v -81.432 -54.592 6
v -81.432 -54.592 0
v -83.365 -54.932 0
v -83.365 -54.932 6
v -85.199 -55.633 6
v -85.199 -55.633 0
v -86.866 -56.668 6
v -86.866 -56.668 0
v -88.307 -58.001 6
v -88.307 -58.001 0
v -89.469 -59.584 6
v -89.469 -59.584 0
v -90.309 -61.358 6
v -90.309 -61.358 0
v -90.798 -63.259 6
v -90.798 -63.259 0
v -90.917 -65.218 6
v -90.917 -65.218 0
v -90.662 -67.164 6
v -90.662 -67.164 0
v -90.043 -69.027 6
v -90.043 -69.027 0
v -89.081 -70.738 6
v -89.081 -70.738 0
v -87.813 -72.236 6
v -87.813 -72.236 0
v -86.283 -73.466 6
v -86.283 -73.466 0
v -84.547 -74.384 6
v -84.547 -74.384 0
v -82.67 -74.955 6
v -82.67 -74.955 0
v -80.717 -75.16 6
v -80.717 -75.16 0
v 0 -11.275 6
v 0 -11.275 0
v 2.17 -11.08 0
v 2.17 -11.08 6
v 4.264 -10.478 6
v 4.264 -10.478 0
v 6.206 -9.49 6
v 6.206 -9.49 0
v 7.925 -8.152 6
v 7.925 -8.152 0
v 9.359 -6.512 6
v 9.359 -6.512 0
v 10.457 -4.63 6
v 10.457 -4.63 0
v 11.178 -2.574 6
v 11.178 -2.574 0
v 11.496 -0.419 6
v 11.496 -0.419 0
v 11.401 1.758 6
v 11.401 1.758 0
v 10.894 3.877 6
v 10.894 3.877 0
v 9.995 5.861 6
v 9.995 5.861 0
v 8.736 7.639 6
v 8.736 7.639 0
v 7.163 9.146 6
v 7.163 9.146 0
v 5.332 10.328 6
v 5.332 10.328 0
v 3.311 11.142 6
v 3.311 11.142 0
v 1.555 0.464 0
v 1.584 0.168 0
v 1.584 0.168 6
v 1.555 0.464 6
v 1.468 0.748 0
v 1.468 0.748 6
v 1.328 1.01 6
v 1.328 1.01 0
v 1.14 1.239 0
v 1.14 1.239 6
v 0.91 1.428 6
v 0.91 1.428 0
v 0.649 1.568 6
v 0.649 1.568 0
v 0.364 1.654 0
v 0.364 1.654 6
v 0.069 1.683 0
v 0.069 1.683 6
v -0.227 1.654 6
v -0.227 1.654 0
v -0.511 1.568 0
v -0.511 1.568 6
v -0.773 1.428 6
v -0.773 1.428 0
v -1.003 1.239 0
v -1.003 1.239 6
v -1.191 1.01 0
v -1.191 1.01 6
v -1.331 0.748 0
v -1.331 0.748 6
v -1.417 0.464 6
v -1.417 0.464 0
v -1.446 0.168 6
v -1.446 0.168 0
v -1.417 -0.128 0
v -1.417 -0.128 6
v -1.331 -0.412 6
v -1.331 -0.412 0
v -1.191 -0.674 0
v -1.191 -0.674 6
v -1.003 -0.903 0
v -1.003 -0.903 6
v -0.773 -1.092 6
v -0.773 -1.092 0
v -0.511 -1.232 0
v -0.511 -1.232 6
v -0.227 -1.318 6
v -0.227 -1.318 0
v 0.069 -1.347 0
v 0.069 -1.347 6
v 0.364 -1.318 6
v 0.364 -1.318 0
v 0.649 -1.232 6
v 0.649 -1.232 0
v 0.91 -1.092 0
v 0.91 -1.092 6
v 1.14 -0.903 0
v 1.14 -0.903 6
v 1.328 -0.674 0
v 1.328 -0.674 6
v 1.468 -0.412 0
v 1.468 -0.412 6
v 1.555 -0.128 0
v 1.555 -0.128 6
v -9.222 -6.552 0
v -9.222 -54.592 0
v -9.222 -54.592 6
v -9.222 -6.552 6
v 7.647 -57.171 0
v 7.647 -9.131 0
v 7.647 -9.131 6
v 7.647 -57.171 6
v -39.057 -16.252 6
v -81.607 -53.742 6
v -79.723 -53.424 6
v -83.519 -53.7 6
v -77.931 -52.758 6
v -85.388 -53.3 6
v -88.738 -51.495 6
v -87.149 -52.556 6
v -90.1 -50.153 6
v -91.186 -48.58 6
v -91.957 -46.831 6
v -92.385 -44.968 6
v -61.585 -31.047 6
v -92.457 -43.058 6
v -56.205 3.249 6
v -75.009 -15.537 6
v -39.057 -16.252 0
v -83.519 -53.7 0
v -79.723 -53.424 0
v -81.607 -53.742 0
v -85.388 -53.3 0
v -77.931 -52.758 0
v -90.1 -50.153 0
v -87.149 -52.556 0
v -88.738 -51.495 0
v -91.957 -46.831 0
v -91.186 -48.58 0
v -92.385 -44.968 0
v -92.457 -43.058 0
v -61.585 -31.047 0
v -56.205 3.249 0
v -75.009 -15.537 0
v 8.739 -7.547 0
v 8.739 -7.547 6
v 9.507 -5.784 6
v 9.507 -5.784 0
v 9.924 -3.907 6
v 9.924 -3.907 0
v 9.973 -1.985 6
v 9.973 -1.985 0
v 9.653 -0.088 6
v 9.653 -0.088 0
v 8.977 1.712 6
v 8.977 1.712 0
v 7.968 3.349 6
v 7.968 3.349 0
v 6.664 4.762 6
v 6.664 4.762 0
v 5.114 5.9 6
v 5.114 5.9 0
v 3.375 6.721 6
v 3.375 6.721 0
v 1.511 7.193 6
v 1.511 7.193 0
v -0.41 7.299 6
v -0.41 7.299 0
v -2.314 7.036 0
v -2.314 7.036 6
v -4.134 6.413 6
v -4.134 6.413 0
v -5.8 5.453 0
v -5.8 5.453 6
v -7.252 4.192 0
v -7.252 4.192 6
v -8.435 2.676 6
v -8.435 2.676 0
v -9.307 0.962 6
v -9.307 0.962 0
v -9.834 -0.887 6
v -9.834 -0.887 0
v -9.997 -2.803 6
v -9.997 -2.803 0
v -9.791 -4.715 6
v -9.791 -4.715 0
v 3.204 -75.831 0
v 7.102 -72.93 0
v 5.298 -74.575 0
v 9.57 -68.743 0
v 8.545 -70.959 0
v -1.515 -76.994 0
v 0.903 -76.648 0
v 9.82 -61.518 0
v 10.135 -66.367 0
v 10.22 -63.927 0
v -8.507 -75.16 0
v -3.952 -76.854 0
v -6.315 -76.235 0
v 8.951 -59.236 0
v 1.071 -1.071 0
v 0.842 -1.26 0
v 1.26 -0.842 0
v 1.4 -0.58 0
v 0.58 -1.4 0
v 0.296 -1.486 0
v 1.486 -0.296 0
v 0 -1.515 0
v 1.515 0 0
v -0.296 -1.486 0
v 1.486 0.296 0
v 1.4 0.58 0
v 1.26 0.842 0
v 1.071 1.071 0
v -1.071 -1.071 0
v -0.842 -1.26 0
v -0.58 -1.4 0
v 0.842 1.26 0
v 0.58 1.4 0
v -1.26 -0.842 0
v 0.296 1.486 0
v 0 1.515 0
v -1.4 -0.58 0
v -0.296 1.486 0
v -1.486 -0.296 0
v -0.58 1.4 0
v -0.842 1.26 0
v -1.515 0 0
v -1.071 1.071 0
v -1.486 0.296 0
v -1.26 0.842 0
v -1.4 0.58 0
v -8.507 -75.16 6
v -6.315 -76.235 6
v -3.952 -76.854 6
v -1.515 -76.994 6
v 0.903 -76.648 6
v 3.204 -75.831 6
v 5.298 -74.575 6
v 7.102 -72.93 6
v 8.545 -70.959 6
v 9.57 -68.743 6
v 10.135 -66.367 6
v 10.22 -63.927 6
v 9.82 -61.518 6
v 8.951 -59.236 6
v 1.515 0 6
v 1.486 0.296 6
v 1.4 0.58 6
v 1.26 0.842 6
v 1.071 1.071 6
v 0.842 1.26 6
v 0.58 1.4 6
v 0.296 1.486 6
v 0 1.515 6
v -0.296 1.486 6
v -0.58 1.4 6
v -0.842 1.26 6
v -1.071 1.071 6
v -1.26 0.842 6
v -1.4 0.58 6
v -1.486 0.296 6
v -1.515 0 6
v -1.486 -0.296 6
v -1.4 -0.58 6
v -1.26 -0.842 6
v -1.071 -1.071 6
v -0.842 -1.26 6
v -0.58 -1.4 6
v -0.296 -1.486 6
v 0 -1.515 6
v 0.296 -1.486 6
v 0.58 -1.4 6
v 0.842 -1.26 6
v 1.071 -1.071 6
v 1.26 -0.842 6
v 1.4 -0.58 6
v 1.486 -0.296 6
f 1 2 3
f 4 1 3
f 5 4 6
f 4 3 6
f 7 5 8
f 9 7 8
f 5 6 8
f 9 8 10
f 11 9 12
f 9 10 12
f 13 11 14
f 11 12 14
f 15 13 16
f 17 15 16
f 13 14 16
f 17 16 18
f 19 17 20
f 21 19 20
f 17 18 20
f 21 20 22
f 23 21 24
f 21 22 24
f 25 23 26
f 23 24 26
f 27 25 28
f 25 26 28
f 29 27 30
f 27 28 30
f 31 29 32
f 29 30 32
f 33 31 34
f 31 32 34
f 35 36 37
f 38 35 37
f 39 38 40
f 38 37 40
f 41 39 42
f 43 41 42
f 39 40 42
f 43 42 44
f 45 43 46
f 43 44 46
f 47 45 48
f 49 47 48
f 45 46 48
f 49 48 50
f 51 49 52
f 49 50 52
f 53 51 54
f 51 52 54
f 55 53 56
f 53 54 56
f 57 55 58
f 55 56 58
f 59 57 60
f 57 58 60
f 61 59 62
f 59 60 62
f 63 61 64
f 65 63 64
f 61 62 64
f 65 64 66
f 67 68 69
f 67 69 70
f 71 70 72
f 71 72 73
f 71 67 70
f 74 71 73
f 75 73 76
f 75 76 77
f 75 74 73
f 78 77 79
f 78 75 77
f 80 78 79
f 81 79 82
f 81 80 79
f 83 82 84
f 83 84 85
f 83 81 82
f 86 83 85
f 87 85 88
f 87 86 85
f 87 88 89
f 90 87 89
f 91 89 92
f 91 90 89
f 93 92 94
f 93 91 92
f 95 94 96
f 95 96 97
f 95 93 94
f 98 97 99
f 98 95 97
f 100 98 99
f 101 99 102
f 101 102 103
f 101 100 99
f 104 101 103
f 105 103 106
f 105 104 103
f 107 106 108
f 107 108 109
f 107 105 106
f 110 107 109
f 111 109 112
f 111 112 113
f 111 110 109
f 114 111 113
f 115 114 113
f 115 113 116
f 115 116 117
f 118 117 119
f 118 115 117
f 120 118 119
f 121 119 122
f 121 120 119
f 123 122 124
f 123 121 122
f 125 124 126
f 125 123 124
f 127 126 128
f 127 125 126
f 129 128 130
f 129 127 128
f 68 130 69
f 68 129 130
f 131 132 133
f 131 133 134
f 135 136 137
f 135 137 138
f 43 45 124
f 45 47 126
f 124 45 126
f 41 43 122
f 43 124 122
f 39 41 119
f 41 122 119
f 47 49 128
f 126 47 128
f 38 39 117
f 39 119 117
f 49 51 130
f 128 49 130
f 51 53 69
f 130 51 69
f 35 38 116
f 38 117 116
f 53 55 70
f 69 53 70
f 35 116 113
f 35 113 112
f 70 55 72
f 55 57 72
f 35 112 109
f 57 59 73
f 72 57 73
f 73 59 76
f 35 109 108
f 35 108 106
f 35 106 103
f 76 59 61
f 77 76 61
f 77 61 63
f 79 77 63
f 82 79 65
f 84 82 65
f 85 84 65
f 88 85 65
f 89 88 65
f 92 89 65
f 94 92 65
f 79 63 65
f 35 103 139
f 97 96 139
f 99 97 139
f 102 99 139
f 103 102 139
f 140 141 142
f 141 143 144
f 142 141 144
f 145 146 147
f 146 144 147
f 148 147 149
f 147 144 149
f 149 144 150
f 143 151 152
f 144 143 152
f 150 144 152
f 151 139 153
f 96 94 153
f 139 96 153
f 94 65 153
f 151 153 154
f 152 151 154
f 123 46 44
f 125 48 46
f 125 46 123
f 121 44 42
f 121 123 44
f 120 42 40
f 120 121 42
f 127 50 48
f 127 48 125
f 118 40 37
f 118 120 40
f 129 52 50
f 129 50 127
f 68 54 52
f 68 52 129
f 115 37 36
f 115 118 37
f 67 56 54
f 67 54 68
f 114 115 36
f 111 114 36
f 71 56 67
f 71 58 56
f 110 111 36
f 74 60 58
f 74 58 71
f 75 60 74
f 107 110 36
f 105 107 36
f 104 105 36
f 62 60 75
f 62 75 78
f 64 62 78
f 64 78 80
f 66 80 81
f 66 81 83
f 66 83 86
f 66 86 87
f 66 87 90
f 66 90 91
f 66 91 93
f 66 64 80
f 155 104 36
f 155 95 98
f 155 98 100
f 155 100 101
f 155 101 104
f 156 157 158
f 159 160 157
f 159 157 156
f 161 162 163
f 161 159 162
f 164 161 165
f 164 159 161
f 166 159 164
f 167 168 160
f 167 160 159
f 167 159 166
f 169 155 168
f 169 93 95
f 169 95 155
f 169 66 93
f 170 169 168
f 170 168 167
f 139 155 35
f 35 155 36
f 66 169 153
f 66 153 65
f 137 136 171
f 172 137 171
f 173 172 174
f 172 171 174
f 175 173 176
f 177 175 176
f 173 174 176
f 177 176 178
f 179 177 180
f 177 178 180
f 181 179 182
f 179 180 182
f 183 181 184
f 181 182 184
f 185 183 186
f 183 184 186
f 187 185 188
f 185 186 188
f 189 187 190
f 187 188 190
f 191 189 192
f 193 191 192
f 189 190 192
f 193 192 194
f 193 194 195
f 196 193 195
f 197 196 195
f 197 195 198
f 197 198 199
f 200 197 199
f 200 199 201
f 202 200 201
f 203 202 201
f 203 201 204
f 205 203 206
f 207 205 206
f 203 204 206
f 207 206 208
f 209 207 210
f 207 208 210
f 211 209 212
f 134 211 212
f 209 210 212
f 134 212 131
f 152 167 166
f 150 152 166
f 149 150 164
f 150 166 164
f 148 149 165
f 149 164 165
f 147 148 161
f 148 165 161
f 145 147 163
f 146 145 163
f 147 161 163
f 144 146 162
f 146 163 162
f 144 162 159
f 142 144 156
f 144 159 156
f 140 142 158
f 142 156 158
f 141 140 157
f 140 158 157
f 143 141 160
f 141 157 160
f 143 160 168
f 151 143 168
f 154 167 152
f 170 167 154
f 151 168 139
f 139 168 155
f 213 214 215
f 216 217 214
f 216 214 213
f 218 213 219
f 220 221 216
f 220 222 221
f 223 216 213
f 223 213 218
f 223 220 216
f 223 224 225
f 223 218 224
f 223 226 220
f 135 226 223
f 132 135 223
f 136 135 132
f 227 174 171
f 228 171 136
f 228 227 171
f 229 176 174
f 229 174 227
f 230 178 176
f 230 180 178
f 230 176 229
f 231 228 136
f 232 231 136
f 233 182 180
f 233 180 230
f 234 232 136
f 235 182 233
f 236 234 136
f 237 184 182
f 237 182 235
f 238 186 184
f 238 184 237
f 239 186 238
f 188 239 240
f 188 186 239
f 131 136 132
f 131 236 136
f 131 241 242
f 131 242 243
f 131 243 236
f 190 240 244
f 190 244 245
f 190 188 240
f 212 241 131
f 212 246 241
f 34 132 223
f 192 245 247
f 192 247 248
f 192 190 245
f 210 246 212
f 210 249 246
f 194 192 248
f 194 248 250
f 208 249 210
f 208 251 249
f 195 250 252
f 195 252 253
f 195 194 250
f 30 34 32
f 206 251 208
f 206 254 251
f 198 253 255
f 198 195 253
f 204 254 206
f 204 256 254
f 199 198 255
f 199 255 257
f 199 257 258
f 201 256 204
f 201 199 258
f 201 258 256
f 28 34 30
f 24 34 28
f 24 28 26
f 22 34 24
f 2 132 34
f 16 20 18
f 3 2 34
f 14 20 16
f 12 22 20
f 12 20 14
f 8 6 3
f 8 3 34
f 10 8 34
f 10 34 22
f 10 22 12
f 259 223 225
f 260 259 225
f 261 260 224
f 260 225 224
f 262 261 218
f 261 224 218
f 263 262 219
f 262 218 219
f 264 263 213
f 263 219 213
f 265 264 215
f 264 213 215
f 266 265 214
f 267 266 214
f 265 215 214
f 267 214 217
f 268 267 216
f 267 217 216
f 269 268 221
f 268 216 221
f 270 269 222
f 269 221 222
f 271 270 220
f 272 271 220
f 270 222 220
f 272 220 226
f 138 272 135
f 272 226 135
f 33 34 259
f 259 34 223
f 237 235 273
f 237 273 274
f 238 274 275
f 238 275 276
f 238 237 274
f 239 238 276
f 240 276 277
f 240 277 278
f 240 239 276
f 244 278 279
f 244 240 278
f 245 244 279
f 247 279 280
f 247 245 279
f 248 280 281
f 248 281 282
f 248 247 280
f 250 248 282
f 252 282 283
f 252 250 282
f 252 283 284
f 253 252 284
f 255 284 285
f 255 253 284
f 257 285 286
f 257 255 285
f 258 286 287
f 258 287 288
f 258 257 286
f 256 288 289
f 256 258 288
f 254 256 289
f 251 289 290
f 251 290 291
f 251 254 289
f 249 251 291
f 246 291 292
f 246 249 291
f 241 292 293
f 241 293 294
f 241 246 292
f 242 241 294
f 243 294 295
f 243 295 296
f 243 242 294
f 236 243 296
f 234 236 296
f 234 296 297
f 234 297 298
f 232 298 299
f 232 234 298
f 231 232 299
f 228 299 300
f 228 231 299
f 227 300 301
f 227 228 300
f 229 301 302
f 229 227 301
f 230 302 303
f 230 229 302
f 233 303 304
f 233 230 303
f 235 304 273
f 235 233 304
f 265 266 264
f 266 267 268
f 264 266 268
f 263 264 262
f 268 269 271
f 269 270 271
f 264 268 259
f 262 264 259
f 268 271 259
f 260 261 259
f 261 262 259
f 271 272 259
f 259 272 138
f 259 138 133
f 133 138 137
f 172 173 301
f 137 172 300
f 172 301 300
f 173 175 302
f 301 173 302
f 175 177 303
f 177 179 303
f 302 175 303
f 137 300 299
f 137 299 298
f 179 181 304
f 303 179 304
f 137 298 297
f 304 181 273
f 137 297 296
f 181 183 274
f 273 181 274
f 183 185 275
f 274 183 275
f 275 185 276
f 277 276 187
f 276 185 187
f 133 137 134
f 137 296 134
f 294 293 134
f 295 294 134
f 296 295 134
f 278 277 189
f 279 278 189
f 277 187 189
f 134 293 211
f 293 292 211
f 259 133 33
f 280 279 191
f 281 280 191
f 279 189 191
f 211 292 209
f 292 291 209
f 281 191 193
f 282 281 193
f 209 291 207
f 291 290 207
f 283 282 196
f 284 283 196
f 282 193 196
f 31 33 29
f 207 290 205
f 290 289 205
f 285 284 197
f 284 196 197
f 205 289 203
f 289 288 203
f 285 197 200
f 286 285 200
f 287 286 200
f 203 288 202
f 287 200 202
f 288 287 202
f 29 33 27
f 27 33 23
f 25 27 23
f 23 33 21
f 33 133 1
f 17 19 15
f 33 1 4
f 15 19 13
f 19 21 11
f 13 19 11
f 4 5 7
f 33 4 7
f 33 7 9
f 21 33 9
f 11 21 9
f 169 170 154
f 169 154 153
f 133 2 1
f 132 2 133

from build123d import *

# Parameters (mm, degrees)
SKETCH_R     = 1.515
PAD_DEPTH    = 6
SKETCH001_R  = 1.515
PAD001_DEPTH = 6


with BuildPart() as dedo_gordo:
    # Sketch → Pad (new body)
    with BuildSketch(Plane.XY):
        with BuildLine():
            Line((-81.431848, -54.59229), (-9.221848, -54.59229))
            Line((-9.221848, -54.59229), (-9.221848, -6.55229))
            ThreePointArc((7.647313, -9.130537), (1.510507, 7.192648), (-9.221848, -6.55229))
            Line((7.647313, -9.130537), (7.647313, -57.170537))
            ThreePointArc((-8.507445, -75.160048), (7.102426, -72.929545), (7.647313, -57.170537))
            Line((-80.717445, -75.160048), (-8.507445, -75.160048))
            ThreePointArc((-81.431848, -54.59229), (-90.916781, -65.218027), (-80.717445, -75.160048))
        make_face()
        Circle(SKETCH_R, mode=Mode.SUBTRACT)
    extrude(amount=PAD_DEPTH)


with BuildPart() as dedo_indice:
    # Sketch001 → Pad001 (new body)
    with BuildSketch(Plane.XY):
        with BuildLine():
            Line((-92.456543, -43.057655), (-75.009216, -15.536896))
            Line((-75.009216, -15.536896), (-56.204937, 3.249128))
            Line((-56.204937, 3.249128), (3.311282, 11.141696))
            ThreePointArc((0, -11.274597), (11.388689, -1.504193), (3.311282, 11.141696))
            Line((-39.056995, -16.252441), (0, -11.274597))
            Line((-61.584679, -31.046738), (-39.056995, -16.252441))
            Line((-77.930831, -52.757955), (-61.584679, -31.046738))
            ThreePointArc((-92.456543, -43.057655), (-87.968497, -52.062944), (-77.930831, -52.757955))
        make_face()
        with Locations((0.068762, 0.16796)):
            Circle(SKETCH001_R, mode=Mode.SUBTRACT)
    extrude(amount=PAD001_DEPTH)


solid = Compound([dedo_gordo.part, dedo_indice.part])
